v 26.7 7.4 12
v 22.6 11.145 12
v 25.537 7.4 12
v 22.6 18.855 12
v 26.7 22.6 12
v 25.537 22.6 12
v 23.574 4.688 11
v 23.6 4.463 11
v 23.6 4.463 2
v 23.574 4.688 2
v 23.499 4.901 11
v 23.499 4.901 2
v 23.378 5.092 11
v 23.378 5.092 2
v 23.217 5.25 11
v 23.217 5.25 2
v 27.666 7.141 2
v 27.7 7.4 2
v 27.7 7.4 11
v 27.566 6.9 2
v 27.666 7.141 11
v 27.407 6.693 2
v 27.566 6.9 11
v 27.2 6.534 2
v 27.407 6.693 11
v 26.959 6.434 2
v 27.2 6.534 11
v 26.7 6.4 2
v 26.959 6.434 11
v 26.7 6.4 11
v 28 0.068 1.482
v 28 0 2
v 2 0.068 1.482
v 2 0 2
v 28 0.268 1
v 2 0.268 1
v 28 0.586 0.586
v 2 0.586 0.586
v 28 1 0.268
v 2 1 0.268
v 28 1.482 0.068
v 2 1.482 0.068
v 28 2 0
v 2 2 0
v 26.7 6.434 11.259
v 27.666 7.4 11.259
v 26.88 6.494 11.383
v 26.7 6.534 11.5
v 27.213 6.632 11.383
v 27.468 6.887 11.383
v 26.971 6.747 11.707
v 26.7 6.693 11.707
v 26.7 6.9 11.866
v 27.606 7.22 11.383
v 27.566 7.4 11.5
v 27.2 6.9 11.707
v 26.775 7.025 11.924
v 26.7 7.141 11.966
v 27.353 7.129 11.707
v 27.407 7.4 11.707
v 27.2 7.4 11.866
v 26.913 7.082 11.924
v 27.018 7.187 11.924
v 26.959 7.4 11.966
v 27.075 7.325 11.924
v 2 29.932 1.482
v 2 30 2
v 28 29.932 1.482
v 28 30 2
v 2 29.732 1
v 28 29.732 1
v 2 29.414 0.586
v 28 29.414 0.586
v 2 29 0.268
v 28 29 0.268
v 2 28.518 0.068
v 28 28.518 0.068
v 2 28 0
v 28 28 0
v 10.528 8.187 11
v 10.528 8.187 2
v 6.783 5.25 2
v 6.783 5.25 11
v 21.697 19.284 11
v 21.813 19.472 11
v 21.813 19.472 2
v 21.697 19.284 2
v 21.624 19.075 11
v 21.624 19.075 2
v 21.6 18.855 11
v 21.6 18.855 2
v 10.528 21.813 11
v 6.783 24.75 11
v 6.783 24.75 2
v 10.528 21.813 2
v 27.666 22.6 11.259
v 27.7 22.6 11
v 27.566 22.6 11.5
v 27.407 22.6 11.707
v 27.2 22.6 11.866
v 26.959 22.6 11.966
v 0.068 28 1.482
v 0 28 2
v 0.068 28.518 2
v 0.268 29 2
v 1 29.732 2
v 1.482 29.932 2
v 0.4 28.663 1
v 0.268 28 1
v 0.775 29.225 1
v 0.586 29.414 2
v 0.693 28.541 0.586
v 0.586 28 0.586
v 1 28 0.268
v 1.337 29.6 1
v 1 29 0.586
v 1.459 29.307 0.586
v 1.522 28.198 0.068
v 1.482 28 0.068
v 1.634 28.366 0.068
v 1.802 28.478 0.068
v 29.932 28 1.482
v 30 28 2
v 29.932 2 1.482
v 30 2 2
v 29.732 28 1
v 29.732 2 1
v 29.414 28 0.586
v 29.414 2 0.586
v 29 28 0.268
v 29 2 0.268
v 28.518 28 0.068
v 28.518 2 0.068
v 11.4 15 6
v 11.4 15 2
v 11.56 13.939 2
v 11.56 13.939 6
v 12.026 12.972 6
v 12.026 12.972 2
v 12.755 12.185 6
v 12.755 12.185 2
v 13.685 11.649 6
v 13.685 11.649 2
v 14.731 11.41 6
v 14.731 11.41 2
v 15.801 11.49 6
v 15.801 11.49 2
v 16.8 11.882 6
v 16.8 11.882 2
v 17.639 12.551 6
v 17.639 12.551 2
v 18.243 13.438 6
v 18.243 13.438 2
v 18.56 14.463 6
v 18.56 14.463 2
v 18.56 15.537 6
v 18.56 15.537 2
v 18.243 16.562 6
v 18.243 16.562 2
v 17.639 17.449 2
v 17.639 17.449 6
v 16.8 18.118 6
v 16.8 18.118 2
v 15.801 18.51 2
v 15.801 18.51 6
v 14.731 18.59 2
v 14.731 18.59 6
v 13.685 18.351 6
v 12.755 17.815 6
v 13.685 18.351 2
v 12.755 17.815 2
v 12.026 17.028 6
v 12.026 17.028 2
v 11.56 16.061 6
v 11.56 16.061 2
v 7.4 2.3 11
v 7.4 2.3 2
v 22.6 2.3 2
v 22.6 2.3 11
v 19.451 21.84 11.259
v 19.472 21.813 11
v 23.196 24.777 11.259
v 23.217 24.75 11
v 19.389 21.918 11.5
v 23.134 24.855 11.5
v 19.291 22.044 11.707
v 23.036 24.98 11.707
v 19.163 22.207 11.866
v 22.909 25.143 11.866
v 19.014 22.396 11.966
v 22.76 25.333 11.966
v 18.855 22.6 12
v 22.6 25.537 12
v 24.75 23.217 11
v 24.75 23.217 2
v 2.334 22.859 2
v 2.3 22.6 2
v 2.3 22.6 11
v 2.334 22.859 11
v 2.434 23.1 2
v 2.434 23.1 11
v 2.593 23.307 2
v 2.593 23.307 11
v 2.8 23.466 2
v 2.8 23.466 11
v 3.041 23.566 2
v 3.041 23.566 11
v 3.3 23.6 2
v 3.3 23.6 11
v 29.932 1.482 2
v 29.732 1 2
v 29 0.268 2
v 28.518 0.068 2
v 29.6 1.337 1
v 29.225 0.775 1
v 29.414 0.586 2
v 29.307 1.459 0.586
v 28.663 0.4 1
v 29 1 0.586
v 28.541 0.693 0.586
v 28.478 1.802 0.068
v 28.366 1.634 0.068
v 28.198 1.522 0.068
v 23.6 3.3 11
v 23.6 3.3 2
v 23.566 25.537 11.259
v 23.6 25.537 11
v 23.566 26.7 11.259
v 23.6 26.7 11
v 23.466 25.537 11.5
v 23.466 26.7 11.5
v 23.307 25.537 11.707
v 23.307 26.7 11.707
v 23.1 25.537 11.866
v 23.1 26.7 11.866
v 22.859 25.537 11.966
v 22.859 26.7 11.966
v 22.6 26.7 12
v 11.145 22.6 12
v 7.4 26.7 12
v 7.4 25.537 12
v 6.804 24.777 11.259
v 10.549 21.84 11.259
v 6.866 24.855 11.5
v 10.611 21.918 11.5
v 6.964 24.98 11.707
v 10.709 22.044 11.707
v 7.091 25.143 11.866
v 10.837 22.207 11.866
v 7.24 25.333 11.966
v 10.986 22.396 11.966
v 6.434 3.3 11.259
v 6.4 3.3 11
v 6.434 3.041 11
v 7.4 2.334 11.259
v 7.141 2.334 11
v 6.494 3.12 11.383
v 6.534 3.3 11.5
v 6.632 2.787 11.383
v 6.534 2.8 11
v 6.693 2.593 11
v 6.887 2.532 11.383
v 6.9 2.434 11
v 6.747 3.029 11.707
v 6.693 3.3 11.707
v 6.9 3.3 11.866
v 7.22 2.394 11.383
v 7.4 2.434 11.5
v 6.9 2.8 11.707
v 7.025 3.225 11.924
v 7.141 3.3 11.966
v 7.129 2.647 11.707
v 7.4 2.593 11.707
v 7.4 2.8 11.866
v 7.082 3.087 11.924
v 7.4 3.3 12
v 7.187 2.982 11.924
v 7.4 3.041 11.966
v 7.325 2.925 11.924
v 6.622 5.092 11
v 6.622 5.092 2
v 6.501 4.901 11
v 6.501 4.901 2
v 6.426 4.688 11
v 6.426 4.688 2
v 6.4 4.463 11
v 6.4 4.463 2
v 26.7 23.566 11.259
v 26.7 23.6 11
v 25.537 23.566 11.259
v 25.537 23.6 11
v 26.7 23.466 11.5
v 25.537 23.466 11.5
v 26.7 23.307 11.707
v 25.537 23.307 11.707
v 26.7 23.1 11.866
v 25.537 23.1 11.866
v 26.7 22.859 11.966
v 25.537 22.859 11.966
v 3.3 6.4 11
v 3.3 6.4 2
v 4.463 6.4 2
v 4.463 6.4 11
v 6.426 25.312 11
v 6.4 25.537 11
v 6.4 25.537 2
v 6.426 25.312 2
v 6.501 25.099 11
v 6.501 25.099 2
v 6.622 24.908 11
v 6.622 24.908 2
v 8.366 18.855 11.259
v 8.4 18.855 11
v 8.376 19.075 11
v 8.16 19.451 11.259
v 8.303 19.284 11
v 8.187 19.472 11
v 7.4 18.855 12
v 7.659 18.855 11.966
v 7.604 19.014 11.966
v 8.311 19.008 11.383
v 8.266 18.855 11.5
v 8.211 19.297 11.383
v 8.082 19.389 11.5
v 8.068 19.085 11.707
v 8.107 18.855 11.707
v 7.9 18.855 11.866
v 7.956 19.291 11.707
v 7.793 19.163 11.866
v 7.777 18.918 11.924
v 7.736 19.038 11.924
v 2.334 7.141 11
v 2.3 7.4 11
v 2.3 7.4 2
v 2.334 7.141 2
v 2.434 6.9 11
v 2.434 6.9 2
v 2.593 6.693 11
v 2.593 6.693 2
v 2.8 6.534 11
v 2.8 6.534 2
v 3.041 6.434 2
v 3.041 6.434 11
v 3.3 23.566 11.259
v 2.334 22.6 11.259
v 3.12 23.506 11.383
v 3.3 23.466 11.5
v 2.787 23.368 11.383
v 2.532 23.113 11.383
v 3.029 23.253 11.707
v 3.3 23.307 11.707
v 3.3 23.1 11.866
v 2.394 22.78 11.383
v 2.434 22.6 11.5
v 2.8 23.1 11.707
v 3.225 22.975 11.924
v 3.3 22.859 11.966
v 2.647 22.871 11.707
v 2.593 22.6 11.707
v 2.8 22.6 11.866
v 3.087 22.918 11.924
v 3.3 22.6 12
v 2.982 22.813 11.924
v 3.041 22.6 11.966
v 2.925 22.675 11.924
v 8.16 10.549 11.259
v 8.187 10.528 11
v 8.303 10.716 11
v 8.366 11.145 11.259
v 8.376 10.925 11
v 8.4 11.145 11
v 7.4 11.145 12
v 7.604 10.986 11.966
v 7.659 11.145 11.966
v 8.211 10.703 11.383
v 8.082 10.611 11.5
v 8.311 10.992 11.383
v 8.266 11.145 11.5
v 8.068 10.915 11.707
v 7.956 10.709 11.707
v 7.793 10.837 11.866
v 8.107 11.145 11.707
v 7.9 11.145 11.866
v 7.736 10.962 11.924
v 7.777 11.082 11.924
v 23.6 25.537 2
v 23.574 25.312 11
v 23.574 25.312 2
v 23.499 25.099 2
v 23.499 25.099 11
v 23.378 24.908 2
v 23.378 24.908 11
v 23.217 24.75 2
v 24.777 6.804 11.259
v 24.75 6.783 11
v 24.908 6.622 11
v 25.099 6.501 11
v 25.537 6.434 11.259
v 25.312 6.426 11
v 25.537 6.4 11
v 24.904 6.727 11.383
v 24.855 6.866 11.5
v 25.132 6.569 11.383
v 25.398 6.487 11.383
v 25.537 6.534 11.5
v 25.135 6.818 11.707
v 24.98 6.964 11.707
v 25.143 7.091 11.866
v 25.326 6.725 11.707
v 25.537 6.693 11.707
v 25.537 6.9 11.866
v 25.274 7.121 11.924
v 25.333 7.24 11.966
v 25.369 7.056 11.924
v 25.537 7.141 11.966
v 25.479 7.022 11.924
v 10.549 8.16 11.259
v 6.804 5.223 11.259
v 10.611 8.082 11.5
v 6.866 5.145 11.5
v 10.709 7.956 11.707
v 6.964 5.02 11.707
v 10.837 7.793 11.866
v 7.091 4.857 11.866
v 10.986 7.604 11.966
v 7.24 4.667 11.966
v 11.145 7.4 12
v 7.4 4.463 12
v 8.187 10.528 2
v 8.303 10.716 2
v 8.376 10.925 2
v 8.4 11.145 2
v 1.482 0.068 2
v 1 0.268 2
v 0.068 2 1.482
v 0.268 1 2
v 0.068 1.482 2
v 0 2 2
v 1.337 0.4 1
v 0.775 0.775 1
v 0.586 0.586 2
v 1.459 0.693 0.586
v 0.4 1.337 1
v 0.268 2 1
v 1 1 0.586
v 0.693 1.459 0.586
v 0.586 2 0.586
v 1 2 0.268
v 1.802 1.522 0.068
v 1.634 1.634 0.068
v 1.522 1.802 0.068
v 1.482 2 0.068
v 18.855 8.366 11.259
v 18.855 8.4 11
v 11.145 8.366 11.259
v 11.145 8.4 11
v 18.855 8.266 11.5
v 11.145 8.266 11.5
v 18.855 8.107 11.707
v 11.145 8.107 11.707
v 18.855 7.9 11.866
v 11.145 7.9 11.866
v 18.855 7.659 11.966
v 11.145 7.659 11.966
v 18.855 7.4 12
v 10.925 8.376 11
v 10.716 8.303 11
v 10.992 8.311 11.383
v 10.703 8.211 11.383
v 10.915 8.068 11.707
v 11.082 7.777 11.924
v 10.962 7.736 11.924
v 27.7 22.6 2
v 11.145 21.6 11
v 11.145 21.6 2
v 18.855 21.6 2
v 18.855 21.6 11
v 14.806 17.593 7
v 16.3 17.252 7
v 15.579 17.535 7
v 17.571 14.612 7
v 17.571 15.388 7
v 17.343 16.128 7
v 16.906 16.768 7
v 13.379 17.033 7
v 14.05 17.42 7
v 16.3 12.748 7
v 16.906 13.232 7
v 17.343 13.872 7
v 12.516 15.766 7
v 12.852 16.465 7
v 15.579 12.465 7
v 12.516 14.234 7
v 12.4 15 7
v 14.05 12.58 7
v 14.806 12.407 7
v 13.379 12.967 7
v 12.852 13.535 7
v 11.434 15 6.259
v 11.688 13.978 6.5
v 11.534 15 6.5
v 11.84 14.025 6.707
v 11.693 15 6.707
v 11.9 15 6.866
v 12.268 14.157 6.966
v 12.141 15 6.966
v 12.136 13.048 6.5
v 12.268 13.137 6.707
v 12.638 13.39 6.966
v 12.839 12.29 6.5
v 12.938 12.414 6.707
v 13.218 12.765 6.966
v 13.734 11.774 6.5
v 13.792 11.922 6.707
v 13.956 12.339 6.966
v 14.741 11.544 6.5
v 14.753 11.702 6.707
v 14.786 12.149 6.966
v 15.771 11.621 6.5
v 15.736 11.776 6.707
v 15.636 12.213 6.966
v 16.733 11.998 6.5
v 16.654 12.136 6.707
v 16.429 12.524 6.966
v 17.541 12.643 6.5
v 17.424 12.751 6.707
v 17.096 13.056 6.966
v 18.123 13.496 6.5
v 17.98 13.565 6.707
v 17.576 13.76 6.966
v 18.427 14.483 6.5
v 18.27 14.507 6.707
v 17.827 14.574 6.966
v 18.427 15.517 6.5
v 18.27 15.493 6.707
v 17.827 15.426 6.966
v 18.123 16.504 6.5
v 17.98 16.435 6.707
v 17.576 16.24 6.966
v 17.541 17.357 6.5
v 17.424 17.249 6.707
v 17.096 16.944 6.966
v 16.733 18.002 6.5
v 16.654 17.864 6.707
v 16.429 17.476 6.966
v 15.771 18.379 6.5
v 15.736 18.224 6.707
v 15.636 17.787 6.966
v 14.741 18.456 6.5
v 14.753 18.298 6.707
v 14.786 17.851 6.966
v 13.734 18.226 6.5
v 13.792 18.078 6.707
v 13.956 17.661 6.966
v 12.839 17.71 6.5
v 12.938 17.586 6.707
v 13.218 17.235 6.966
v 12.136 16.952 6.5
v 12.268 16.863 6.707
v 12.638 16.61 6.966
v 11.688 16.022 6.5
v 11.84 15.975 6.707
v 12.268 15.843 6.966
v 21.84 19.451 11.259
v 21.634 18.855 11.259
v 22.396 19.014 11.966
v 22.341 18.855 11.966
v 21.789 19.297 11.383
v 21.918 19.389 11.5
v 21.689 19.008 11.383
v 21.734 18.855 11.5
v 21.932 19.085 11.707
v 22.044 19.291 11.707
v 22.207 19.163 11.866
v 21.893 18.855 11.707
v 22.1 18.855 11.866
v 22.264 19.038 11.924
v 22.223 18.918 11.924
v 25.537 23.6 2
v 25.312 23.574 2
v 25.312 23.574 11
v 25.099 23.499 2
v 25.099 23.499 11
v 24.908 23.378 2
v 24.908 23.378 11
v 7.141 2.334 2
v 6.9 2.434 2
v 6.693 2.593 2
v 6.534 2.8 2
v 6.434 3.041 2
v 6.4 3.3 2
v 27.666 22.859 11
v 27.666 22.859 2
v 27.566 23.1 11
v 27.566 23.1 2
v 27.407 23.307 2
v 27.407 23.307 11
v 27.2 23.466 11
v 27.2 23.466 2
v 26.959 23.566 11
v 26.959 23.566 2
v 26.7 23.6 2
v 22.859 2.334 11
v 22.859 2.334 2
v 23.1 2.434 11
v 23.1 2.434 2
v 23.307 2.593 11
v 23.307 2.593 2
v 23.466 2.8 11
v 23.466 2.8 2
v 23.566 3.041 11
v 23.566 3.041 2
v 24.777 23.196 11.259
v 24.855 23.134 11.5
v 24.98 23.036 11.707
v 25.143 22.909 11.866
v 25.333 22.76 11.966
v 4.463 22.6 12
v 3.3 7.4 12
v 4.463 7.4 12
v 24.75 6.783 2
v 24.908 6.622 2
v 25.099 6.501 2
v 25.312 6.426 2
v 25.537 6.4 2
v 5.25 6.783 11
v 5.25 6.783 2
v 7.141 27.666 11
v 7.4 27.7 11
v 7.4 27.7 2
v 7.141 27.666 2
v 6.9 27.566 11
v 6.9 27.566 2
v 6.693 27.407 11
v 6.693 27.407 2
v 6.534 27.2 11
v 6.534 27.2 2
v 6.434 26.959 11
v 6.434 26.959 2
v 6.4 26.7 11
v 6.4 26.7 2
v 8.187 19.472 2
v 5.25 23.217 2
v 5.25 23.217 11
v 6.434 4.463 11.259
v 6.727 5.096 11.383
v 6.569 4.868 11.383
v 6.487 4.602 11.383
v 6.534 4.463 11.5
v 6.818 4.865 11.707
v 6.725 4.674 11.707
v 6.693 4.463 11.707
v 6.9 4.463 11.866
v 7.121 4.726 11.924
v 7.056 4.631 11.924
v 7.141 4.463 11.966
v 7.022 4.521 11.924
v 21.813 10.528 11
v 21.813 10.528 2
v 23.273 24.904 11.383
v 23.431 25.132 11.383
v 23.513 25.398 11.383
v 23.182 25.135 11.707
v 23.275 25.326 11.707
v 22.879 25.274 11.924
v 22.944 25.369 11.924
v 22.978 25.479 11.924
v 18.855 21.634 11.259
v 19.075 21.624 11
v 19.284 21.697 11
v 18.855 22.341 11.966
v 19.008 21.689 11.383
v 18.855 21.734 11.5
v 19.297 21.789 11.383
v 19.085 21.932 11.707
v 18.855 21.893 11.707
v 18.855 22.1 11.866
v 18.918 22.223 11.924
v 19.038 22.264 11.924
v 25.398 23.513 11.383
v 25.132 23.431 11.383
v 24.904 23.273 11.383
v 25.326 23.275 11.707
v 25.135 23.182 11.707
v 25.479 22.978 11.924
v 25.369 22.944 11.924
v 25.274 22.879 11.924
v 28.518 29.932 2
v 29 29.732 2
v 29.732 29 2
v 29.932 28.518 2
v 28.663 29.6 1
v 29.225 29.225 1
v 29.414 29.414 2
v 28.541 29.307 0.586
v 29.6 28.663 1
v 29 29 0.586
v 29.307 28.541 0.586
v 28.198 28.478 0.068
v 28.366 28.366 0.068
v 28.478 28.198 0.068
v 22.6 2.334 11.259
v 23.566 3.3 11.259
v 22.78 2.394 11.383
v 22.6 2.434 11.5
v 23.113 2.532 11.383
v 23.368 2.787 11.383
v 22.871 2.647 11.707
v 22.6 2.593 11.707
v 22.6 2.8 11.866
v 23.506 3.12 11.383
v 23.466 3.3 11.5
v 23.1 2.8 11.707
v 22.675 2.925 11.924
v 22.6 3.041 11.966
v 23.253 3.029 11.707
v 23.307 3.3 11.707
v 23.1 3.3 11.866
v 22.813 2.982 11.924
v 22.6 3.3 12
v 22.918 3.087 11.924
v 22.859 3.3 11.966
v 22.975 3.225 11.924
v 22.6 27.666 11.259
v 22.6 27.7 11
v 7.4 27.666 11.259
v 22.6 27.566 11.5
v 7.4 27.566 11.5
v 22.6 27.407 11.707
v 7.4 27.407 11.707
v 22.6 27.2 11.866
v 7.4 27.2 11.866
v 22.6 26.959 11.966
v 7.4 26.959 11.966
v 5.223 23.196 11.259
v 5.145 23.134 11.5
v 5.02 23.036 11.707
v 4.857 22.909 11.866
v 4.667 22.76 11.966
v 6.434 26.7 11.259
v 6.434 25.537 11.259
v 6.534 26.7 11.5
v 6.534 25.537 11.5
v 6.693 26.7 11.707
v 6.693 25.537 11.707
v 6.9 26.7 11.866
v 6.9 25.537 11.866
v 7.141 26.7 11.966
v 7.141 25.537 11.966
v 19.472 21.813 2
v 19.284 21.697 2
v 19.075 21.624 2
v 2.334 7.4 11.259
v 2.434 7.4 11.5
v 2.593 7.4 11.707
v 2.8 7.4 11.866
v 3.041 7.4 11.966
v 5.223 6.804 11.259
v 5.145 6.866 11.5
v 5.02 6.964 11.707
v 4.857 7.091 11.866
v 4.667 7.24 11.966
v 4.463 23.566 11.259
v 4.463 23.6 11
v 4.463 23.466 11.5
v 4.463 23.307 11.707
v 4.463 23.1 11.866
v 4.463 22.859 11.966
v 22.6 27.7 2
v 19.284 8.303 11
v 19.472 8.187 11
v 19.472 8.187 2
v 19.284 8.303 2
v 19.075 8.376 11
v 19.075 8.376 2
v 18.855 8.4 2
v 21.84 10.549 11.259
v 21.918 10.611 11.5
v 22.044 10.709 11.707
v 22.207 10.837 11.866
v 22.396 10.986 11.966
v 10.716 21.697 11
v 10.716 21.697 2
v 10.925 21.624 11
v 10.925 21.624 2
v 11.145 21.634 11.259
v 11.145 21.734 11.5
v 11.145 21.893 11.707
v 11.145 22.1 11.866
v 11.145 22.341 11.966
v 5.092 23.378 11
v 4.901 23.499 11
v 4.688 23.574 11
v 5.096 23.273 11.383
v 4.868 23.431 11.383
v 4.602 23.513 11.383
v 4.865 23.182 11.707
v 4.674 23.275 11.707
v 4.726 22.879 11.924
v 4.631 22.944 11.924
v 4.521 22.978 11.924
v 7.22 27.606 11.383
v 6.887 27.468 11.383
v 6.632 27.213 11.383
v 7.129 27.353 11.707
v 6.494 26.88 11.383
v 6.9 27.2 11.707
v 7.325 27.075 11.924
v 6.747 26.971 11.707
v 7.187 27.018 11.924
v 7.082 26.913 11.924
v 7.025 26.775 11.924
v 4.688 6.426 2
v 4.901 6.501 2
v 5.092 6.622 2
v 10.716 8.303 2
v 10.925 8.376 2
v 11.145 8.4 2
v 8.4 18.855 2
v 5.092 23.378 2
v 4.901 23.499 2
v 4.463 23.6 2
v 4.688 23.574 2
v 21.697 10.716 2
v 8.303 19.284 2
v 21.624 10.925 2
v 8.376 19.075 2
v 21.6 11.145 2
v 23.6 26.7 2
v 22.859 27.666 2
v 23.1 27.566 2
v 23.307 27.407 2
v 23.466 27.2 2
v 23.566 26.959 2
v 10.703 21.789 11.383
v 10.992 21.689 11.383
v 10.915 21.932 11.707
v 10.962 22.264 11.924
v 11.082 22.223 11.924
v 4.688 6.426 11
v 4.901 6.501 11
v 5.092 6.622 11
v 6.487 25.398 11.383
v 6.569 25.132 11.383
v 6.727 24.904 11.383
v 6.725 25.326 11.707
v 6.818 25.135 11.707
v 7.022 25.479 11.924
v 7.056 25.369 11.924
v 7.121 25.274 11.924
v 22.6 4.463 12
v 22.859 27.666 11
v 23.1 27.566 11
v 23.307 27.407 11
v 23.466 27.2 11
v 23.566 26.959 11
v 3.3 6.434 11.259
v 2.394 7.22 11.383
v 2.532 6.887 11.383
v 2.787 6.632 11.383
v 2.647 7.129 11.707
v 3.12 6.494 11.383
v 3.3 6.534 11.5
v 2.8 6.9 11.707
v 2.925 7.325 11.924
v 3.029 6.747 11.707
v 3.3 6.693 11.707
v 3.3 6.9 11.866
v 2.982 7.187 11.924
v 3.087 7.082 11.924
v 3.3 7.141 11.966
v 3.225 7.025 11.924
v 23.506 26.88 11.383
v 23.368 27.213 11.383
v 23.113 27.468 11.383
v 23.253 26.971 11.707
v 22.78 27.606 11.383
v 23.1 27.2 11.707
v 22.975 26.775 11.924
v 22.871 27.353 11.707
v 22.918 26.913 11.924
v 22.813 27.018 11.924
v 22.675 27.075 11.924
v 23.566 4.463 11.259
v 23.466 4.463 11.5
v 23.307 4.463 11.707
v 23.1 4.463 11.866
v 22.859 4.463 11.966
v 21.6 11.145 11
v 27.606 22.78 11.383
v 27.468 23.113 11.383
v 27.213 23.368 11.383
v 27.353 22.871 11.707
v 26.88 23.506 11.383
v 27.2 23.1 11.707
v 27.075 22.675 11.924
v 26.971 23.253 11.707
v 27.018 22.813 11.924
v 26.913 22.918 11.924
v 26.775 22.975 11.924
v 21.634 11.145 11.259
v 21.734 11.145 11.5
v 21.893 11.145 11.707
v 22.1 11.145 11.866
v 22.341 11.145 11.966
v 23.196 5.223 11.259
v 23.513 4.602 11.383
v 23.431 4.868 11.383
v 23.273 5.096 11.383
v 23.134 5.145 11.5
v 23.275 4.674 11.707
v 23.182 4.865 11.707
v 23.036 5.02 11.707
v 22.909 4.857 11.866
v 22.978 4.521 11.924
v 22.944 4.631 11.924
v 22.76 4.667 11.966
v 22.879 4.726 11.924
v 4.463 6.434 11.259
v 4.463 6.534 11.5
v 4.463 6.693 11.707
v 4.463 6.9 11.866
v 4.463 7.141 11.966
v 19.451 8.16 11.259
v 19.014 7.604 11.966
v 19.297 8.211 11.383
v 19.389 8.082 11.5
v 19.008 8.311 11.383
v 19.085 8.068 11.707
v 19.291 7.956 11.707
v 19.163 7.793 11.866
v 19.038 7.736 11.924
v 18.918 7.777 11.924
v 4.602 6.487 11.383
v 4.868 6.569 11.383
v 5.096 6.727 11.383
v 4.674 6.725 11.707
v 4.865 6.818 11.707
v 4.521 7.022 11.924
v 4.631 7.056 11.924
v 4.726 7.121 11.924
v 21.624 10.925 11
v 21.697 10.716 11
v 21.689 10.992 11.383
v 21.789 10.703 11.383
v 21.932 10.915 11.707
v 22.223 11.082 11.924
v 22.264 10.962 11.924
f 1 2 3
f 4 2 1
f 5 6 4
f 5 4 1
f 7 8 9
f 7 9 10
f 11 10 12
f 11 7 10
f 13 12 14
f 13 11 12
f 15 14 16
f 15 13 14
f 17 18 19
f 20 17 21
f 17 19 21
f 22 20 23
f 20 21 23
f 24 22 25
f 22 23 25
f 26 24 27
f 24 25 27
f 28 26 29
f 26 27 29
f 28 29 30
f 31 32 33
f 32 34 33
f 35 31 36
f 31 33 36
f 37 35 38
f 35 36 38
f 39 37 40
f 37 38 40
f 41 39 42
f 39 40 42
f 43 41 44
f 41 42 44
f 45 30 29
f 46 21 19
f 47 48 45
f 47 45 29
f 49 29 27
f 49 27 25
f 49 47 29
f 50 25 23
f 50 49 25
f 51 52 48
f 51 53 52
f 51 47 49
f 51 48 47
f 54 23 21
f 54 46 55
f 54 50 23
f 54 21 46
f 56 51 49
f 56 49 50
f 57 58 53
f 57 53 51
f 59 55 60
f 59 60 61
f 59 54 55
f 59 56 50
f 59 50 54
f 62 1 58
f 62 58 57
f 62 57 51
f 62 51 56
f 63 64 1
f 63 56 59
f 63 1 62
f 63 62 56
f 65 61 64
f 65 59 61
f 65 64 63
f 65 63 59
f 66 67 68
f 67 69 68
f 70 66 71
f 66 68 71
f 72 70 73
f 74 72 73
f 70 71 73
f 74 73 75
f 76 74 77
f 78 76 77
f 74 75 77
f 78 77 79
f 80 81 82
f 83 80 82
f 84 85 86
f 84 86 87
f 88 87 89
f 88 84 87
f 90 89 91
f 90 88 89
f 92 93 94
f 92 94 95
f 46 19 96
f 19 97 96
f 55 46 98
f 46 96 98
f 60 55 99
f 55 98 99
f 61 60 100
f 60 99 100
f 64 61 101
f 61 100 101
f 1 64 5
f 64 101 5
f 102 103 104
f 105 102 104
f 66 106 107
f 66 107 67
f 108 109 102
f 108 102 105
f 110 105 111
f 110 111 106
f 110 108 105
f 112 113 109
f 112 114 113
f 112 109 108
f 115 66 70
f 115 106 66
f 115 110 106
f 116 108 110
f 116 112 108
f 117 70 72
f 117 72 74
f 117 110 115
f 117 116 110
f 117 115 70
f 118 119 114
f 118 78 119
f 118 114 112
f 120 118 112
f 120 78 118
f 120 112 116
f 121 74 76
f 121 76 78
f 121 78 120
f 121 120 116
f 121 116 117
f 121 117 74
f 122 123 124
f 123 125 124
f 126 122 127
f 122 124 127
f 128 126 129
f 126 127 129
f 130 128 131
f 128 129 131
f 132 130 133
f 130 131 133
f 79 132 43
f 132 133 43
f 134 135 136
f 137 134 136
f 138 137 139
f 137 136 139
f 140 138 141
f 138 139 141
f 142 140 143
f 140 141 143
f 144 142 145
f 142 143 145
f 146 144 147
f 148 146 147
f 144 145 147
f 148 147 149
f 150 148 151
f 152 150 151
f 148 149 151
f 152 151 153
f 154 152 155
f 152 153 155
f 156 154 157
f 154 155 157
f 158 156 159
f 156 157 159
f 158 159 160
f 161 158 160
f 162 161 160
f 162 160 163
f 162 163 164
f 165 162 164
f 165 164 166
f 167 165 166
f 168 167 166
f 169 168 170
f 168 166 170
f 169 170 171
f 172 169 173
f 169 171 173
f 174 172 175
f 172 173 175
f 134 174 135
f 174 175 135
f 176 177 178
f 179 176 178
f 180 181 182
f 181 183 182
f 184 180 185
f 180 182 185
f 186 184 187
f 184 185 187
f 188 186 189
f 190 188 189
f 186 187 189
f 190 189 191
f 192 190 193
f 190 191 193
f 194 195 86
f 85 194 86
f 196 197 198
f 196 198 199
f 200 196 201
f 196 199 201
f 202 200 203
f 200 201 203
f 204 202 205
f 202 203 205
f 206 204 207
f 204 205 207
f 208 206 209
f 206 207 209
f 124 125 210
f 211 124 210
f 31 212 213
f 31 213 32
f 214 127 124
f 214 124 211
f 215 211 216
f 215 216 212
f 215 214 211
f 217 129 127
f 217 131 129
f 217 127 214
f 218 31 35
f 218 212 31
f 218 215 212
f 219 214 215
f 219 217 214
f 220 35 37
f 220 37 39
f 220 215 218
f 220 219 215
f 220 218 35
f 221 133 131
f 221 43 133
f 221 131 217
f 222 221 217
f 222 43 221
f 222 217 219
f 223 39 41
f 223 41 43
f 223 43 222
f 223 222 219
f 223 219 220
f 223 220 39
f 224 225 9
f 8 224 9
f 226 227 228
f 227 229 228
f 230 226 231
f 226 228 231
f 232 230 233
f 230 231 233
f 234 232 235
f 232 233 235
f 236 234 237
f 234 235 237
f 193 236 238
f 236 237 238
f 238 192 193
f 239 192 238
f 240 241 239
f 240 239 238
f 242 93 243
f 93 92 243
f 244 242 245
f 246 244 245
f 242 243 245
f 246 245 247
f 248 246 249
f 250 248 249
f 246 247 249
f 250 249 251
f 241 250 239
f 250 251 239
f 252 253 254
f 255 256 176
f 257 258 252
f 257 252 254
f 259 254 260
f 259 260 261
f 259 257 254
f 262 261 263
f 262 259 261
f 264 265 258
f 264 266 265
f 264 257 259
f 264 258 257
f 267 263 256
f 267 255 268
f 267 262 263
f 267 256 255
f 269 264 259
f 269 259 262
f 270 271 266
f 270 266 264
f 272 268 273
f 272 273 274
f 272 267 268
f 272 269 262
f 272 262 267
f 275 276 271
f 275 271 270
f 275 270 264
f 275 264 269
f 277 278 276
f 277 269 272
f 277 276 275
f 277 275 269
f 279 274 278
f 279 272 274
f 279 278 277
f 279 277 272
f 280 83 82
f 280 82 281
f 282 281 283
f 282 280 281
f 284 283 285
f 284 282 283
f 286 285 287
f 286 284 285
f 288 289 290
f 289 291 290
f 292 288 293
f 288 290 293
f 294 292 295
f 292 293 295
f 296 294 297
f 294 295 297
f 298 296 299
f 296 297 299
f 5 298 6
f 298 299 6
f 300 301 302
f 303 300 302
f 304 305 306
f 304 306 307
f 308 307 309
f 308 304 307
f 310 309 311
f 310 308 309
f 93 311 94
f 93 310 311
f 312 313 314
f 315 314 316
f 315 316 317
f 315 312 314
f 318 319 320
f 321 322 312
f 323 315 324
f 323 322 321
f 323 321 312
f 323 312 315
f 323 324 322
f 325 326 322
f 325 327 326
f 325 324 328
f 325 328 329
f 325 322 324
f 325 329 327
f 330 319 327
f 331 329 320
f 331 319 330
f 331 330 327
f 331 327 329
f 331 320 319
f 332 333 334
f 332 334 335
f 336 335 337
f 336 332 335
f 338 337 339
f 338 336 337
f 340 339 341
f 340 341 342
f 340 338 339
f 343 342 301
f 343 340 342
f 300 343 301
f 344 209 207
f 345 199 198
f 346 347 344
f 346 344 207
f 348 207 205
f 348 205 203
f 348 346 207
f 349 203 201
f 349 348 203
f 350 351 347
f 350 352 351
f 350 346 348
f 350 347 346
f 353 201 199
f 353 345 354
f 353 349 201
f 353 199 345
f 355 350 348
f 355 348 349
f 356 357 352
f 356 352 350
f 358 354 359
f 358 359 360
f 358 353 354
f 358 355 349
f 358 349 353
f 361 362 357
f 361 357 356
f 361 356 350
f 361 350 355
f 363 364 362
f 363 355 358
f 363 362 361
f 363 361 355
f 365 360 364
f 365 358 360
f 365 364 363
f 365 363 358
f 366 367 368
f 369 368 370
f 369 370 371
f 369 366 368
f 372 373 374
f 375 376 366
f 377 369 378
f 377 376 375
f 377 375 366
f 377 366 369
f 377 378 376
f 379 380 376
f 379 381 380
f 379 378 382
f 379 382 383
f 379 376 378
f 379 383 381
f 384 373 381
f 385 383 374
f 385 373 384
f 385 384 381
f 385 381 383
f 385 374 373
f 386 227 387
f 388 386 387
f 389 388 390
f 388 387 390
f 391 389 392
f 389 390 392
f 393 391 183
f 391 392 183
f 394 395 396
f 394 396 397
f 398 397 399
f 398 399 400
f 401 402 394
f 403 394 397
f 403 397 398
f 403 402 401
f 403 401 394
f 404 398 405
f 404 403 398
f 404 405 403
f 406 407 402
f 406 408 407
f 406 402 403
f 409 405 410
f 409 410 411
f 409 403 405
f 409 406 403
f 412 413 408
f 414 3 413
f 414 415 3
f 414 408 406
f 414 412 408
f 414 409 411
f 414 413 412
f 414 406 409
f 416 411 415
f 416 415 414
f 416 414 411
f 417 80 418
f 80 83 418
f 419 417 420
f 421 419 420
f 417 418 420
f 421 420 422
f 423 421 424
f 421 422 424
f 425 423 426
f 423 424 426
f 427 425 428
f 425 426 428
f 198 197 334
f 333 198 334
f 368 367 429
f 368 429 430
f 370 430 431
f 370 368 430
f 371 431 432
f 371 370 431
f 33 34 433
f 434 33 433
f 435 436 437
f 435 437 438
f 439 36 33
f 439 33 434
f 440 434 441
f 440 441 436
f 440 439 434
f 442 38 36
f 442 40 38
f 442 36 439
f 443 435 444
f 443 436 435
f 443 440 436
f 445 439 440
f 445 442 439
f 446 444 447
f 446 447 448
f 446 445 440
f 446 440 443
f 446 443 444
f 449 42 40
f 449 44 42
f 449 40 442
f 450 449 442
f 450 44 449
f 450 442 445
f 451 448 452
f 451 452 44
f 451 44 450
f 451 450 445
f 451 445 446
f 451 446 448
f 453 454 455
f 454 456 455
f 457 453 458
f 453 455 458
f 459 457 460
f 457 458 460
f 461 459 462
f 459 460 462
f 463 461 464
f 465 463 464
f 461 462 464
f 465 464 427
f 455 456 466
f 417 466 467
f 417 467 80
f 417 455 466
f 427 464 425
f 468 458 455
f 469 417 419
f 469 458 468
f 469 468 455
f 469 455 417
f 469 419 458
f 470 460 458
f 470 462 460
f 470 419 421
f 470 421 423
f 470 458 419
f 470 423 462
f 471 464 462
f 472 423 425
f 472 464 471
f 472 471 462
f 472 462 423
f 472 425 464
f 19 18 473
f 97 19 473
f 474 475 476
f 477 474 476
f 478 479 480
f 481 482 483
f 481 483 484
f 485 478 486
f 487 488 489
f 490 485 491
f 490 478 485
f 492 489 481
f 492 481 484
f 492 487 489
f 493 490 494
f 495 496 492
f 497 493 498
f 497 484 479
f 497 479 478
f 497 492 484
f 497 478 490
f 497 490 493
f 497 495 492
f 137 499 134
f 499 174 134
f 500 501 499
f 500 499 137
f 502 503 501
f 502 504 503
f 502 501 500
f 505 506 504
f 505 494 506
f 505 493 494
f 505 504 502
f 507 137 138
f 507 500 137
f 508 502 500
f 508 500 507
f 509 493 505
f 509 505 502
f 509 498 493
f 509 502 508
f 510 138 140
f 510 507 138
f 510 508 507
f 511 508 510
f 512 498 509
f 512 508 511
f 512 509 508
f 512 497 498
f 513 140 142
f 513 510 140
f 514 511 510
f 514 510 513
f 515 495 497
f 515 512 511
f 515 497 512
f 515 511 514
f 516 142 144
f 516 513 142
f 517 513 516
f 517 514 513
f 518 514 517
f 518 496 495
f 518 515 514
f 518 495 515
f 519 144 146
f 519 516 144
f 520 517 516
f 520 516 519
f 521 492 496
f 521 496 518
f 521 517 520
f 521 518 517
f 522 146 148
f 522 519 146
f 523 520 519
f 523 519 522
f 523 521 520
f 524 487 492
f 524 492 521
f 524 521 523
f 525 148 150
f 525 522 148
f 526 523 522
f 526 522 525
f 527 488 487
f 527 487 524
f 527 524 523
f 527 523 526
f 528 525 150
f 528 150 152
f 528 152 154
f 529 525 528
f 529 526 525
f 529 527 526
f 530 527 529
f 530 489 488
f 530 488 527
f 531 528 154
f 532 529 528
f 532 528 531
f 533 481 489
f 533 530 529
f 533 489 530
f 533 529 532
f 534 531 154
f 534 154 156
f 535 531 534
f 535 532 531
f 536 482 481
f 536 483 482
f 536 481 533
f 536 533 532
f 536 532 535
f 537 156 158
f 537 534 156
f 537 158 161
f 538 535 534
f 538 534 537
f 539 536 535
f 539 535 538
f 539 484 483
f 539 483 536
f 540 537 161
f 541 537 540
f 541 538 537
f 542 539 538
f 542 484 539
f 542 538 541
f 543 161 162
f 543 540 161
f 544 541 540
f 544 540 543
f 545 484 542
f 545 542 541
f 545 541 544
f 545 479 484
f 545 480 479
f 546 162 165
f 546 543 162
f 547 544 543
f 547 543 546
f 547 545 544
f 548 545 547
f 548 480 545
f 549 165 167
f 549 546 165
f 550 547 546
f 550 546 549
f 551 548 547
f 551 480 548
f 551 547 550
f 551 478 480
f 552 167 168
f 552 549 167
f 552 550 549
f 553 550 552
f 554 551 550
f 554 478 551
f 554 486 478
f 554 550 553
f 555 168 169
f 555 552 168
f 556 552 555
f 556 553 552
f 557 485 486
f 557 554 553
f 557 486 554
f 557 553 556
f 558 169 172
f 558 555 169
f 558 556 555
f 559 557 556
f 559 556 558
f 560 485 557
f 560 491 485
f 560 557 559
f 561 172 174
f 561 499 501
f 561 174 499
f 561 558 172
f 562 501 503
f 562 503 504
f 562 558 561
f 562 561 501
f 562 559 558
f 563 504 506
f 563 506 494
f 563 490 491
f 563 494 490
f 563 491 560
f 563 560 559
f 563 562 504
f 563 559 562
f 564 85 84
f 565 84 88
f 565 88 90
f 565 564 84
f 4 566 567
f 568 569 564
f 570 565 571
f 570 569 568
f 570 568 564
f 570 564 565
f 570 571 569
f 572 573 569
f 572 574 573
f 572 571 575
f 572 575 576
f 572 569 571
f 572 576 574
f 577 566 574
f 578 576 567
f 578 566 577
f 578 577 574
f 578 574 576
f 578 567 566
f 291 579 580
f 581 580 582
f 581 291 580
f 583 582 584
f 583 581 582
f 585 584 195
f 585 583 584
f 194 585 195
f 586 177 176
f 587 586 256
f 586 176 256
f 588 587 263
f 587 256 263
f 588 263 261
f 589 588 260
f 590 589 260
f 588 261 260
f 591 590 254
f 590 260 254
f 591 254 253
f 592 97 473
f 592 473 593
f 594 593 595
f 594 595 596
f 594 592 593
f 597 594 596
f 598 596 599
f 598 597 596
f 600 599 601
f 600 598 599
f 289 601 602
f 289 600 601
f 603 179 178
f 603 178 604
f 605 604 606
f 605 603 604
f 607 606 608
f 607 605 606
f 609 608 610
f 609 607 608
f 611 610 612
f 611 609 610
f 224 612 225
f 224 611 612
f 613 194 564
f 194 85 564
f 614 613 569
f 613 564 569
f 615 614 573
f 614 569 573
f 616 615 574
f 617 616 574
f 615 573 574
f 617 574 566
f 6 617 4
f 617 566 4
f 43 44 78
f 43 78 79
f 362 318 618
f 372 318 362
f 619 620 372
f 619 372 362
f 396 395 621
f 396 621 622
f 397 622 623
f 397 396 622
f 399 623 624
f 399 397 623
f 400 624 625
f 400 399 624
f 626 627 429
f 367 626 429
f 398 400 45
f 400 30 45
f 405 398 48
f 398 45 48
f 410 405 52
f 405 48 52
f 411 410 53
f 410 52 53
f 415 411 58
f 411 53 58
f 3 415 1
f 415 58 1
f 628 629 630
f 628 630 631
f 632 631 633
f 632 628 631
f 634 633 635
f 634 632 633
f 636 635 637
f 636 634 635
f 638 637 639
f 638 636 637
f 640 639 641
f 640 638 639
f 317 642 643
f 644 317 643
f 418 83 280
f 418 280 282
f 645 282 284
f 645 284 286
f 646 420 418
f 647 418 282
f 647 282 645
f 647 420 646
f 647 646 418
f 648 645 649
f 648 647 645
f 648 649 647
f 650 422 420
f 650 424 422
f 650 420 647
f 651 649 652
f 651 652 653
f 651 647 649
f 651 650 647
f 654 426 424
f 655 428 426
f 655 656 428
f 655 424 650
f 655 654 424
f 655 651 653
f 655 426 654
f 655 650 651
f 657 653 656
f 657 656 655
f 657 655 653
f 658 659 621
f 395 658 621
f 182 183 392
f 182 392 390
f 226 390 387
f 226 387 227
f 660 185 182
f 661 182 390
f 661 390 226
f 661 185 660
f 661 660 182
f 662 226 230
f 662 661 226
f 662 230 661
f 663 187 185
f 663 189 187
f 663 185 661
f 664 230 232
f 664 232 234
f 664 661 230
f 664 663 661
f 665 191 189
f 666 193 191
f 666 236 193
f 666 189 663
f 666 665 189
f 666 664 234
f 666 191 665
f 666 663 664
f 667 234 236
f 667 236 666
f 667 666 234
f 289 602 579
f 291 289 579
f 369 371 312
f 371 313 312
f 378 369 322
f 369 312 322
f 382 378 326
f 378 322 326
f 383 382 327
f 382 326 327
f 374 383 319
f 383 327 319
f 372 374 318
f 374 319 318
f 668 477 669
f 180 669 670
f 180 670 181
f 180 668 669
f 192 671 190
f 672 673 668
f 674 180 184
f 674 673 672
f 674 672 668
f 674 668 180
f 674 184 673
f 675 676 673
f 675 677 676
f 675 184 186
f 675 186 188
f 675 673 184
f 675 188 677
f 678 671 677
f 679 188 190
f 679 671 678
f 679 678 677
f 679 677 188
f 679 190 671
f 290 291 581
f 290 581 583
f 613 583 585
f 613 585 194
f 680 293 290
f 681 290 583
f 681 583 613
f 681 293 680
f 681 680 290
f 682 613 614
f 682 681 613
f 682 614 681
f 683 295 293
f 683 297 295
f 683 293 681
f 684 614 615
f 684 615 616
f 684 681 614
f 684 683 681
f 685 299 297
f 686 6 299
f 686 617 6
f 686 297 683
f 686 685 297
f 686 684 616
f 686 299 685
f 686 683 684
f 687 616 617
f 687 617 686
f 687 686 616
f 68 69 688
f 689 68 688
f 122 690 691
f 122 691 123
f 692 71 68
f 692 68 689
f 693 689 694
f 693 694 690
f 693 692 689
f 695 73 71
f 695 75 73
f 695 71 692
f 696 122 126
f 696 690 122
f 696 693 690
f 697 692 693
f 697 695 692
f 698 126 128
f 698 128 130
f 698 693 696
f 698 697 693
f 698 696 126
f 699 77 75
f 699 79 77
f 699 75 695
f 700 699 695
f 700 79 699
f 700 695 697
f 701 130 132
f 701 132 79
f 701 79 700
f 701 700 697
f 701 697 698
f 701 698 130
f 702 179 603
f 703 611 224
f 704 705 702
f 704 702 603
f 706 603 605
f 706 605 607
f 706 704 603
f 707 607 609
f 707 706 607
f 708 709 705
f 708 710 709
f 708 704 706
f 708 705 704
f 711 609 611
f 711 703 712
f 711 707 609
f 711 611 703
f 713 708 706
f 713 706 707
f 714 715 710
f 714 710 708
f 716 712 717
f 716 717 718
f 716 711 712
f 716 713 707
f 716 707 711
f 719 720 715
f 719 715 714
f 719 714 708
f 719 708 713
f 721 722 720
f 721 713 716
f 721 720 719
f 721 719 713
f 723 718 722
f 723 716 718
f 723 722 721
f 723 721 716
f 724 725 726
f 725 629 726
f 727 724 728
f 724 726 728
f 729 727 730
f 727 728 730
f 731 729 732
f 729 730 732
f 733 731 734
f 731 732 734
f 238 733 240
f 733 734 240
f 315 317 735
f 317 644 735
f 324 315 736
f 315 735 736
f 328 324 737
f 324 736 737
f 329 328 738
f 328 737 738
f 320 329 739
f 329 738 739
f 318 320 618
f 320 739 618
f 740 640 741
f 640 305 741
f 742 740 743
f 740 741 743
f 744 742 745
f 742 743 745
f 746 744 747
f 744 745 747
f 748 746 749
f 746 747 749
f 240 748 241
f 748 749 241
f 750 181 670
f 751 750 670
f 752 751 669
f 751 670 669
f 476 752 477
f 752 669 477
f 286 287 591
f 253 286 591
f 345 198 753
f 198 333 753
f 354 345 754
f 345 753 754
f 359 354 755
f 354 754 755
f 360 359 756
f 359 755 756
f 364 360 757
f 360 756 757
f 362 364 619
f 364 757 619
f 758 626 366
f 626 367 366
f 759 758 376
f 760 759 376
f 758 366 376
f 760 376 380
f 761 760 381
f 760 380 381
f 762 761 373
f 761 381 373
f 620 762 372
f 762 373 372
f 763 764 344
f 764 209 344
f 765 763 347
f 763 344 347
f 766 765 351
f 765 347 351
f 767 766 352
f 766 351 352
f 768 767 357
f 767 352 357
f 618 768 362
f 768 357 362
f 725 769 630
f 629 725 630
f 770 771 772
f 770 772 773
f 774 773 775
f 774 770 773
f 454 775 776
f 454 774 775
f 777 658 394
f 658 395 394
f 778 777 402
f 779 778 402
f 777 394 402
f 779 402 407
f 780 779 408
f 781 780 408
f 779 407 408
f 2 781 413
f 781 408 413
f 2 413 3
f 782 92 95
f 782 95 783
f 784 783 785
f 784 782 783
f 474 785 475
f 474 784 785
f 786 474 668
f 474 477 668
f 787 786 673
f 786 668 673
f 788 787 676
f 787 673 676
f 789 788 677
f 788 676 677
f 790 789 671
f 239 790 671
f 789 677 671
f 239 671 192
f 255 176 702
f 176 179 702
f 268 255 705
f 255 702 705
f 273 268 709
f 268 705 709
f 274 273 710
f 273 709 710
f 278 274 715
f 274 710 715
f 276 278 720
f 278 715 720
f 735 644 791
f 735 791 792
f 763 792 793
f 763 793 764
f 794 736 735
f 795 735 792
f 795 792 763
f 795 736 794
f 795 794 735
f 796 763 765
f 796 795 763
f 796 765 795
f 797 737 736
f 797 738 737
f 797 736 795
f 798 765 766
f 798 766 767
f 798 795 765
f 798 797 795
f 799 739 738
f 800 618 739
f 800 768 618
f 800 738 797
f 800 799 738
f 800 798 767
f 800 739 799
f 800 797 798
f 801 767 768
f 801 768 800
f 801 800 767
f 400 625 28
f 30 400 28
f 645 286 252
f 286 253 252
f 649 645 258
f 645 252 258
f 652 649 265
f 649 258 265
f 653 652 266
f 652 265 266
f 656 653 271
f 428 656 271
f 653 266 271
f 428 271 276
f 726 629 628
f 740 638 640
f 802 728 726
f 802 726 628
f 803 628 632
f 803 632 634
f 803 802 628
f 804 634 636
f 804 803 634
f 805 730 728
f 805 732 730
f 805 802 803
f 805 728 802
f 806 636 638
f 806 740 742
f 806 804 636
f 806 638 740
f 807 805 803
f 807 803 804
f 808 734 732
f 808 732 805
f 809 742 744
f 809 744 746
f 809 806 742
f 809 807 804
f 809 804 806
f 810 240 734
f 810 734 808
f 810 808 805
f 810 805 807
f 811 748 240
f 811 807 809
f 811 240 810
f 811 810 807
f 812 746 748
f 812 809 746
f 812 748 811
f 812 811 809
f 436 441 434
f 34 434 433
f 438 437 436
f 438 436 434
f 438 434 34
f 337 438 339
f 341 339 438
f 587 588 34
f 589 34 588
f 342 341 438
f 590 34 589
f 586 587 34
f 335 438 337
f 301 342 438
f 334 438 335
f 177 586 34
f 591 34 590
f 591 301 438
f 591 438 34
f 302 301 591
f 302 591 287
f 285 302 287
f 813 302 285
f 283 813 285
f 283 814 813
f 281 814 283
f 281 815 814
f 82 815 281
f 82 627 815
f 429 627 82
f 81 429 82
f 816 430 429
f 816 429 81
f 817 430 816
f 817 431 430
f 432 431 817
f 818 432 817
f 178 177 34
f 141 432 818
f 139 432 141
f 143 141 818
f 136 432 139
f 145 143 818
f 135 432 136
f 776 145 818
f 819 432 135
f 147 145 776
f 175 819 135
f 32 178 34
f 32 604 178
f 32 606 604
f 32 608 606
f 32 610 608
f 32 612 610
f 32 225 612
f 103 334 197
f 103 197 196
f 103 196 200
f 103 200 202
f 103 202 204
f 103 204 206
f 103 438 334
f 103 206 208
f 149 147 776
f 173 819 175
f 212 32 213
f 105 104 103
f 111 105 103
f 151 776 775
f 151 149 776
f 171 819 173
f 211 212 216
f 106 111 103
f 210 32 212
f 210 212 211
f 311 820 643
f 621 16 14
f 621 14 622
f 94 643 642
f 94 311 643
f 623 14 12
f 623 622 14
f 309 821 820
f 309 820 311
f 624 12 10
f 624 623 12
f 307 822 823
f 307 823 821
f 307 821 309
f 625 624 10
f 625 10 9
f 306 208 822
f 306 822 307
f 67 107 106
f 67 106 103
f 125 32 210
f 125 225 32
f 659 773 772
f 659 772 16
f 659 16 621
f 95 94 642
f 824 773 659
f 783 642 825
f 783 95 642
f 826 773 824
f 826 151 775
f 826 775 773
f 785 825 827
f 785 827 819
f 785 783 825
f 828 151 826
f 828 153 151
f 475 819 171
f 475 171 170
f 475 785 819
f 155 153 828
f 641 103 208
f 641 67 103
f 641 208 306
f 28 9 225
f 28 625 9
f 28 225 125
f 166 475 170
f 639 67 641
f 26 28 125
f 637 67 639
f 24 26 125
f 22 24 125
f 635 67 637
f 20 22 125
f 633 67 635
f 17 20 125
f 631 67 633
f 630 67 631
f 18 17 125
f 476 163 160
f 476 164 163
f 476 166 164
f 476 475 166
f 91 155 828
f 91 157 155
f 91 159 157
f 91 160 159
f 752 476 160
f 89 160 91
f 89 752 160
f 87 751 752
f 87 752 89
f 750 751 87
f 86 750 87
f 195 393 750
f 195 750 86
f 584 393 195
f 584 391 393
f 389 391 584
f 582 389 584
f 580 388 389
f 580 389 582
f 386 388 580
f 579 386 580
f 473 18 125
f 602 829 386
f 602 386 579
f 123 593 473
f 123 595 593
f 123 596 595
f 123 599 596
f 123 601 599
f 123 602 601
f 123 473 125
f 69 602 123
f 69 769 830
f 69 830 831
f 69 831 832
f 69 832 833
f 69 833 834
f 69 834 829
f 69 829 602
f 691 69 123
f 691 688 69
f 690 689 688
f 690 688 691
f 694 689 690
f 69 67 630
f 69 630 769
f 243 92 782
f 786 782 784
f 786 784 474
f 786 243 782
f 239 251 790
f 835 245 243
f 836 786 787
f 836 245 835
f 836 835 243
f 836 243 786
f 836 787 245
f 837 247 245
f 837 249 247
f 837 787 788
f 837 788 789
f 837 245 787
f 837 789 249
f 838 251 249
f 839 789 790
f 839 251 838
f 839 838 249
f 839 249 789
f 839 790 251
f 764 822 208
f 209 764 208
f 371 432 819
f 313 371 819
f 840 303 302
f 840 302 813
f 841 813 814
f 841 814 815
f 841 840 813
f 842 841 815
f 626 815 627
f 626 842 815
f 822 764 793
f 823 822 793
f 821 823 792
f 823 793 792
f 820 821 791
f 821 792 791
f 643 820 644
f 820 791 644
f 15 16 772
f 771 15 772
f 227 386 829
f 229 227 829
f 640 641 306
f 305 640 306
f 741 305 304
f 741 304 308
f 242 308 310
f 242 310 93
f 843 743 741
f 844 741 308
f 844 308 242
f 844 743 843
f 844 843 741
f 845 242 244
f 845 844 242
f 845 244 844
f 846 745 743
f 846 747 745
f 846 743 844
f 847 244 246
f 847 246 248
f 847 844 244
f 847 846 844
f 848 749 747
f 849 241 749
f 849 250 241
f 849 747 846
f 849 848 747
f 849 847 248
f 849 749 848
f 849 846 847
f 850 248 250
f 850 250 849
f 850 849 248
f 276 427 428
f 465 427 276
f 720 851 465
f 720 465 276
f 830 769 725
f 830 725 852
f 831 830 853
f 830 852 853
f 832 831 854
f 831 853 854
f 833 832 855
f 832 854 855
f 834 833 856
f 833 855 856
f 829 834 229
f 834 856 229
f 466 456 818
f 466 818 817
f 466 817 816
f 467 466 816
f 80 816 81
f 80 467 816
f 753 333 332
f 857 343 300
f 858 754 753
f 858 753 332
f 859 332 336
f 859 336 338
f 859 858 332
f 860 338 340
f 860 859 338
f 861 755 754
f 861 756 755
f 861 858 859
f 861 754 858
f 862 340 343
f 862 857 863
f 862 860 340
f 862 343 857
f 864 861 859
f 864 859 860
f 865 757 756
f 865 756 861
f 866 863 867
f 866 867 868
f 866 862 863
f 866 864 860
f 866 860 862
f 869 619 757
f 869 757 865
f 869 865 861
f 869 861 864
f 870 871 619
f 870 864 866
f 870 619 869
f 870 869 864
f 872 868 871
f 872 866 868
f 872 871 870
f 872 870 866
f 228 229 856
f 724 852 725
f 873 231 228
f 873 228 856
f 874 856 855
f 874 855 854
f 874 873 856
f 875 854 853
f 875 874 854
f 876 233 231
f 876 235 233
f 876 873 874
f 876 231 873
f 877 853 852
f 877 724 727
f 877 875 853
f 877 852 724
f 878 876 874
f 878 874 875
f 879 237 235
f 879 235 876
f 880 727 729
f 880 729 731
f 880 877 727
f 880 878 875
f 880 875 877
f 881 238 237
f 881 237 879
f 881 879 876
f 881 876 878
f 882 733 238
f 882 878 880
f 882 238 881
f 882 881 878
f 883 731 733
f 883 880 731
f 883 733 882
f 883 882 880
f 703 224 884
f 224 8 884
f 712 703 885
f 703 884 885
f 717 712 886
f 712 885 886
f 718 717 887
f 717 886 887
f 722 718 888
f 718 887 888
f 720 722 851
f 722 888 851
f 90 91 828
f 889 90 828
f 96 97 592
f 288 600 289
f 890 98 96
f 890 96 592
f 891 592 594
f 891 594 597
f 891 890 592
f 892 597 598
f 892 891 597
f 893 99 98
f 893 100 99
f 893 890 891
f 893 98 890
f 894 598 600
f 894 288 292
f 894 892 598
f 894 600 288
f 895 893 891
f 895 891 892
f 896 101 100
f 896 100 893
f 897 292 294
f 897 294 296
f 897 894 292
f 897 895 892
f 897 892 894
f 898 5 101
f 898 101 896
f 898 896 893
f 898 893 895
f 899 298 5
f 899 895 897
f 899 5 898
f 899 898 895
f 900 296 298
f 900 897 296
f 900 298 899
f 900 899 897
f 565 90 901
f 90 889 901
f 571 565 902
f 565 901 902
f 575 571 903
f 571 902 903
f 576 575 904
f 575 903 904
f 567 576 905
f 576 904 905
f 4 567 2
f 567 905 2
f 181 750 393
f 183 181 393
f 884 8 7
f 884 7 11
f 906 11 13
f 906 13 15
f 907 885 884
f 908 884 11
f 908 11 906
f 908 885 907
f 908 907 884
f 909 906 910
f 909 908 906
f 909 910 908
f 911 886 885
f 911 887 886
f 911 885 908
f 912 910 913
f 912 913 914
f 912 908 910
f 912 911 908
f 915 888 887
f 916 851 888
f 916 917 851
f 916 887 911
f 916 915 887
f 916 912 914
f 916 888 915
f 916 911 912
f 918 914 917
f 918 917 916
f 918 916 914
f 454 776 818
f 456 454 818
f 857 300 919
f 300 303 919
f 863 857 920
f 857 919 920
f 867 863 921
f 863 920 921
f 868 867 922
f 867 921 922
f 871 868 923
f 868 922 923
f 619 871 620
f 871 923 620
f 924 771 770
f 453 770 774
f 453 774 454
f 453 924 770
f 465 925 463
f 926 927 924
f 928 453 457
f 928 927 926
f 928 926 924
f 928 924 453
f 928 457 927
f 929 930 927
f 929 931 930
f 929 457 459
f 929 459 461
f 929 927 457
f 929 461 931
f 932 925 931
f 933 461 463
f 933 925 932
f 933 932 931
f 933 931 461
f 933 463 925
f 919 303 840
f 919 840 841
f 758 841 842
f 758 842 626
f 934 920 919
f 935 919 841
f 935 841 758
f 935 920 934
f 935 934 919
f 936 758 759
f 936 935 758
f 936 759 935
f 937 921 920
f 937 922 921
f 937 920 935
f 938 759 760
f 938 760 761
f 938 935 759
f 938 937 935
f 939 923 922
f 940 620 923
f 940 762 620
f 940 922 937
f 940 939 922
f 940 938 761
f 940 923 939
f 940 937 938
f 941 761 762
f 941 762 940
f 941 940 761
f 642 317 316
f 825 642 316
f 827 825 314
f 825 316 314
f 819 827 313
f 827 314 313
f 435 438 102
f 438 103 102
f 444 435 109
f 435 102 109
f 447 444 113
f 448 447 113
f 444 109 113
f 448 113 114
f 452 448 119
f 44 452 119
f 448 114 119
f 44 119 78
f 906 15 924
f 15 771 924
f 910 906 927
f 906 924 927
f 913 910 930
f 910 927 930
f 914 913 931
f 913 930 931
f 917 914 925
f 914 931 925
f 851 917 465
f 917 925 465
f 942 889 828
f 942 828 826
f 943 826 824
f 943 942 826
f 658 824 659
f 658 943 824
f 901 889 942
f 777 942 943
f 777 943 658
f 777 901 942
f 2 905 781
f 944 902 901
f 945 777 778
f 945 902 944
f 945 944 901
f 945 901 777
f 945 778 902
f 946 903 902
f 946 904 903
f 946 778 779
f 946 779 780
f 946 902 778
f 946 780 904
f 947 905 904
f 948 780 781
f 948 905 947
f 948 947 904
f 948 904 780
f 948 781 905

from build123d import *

# Parameters (mm, degrees)
ESQUISSE1_W                        = 30
ESQUISSE1_H                        = 30
BOSS_EXTRU_1_DEPTH                 = 2
BOSS_EXTRU_5_DEPTH                 = 10
CONG_1_R                           = 1
ESQUISSE2_R                        = 3.6
BOSS_EXTRU_6_DEPTH                 = 5
R_P_TITION_CIRCULAIRE1_COUNT       = 4
CONG_1_OF_R_P_TITION_CIRCULAIRE1_R = 1
CONG_2_R                           = 2
CONG_3_R                           = 1
CONG_4_R                           = 2


with BuildPart() as part:
    # Esquisse1 → Boss.-Extru.1 (new body)
    with BuildSketch(Plane.XY):
        with Locations((15, 15)):
            Rectangle(ESQUISSE1_W, ESQUISSE1_H)
    extrude(amount=BOSS_EXTRU_1_DEPTH)

    # Esquisse5 → Boss.-Extru.5 (add)
    with BuildSketch(Plane.XY.offset(2)):
        Polygon((27.7, 6.4), (27.7, 23.6), (25.05, 23.6), (21.6, 19.2), (21.6, 10.8), (25.05, 6.4), align=None)
    boss_extru_5 = extrude(amount=BOSS_EXTRU_5_DEPTH)

    # Congé1
    cong_1_edges = [part.edges().sort_by_distance(p)[0] for p in [
        (25.05, 6.4, 7),
        (27.7, 6.4, 7),
        (27.7, 23.6, 7),
        (25.05, 23.6, 7),
        (21.6, 19.2, 7),
        (21.6, 10.8, 7),
    ]]
    fillet(cong_1_edges, radius=CONG_1_R)

    # Esquisse2 → Boss.-Extru.6 (add)
    with BuildSketch(Plane.XY.offset(2)):
        with Locations(Location((15, 15, 0), (0, 0, 180))):
            Circle(ESQUISSE2_R)
    extrude(amount=BOSS_EXTRU_6_DEPTH)

    # Répétition circulaire1: Boss.-Extru.5 ×4 about axis
    r_p_tition_circulaire1_axis = Axis((15, 15, 0), (0, 0, 1))
    for i in range(1, R_P_TITION_CIRCULAIRE1_COUNT):
        add(boss_extru_5.rotate(r_p_tition_circulaire1_axis, i * 360 / R_P_TITION_CIRCULAIRE1_COUNT))

    # Congé1 of Répétition circulaire1
    cong_1_of_r_p_tition_circulaire1_edges = [part.edges().sort_by_distance(p)[0] for p in [
        (23.6, 25.05, 7),
        (23.6, 27.7, 7),
        (6.4, 27.7, 7),
        (6.4, 25.05, 7),
        (10.8, 21.6, 7),
        (19.2, 21.6, 7),
        (4.95, 23.6, 7),
        (2.3, 23.6, 7),
        (2.3, 6.4, 7),
        (4.95, 6.4, 7),
        (8.4, 10.8, 7),
        (8.4, 19.2, 7),
        (6.4, 4.95, 7),
        (6.4, 2.3, 7),
        (23.6, 2.3, 7),
        (23.6, 4.95, 7),
        (19.2, 8.4, 7),
        (10.8, 8.4, 7),
    ]]
    fillet(cong_1_of_r_p_tition_circulaire1_edges, radius=CONG_1_OF_R_P_TITION_CIRCULAIRE1_R)

    # Congé2
    cong_2_edges = [part.edges().sort_by_distance(p)[0] for p in [
        (0, 30, 1),
        (30, 30, 1),
        (30, 0, 1),
        (0, 0, 1),
    ]]
    fillet(cong_2_edges, radius=CONG_2_R)

    # Congé3
    cong_3_edges = [part.edges().sort_by_distance(p)[0] for p in [
        (15, 27.7, 12),
        (23.6, 26.118328167, 12),
        (6.4, 26.118328167, 12),
        (8.655619048, 23.28138961, 12),
        (15, 21.6, 12),
        (21.344380952, 23.28138961, 12),
        (6.500824998, 25.099067124, 12),
        (10.818910387, 21.654764961, 12),
        (19.181089613, 21.654764961, 12),
        (23.499175002, 25.099067124, 12),
        (6.692893219, 27.407106781, 12),
        (23.307106781, 27.407106781, 12),
        (2.3, 15, 12),
        (3.881671833, 23.6, 12),
        (3.881671833, 6.4, 12),
        (6.71861039, 8.655619048, 12),
        (8.4, 15, 12),
        (6.71861039, 21.344380952, 12),
        (4.900932876, 6.500824998, 12),
        (8.345235039, 10.818910387, 12),
        (8.345235039, 19.181089613, 12),
        (4.900932876, 23.499175002, 12),
        (2.592893219, 6.692893219, 12),
        (2.592893219, 23.307106781, 12),
        (15, 2.3, 12),
        (6.4, 3.881671833, 12),
        (23.6, 3.881671833, 12),
        (21.344380952, 6.71861039, 12),
        (15, 8.4, 12),
        (8.655619048, 6.71861039, 12),
        (23.499175002, 4.900932876, 12),
        (19.181089613, 8.345235039, 12),
        (10.818910387, 8.345235039, 12),
        (6.500824998, 4.900932876, 12),
        (23.307106781, 2.592893219, 12),
        (6.692893219, 2.592893219, 12),
        (27.7, 15, 12),
        (26.118328167, 6.4, 12),
        (26.118328167, 23.6, 12),
        (23.28138961, 21.344380952, 12),
        (21.6, 15, 12),
        (23.28138961, 8.655619048, 12),
        (25.099067124, 23.499175002, 12),
        (21.654764961, 19.181089613, 12),
        (21.654764961, 10.818910387, 12),
        (25.099067124, 6.500824998, 12),
        (27.407106781, 23.307106781, 12),
        (27.407106781, 6.692893219, 12),
        (18.6, 15, 7),
    ]]
    fillet(cong_3_edges, radius=CONG_3_R)

    # Congé4
    cong_4_edges = [part.edges().sort_by_distance(p)[0] for p in [
        (29.414213562, 29.414213562, 0),
        (15, 30, 0),
        (0.585786438, 29.414213562, 0),
        (0, 15, 0),
        (0.585786438, 0.585786438, 0),
        (15, 0, 0),
        (29.414213562, 0.585786438, 0),
        (30, 15, 0),
    ]]
    fillet(cong_4_edges, radius=CONG_4_R - 0.0001)  # a hair under: the kernel refuses the full size


solid = part.part
